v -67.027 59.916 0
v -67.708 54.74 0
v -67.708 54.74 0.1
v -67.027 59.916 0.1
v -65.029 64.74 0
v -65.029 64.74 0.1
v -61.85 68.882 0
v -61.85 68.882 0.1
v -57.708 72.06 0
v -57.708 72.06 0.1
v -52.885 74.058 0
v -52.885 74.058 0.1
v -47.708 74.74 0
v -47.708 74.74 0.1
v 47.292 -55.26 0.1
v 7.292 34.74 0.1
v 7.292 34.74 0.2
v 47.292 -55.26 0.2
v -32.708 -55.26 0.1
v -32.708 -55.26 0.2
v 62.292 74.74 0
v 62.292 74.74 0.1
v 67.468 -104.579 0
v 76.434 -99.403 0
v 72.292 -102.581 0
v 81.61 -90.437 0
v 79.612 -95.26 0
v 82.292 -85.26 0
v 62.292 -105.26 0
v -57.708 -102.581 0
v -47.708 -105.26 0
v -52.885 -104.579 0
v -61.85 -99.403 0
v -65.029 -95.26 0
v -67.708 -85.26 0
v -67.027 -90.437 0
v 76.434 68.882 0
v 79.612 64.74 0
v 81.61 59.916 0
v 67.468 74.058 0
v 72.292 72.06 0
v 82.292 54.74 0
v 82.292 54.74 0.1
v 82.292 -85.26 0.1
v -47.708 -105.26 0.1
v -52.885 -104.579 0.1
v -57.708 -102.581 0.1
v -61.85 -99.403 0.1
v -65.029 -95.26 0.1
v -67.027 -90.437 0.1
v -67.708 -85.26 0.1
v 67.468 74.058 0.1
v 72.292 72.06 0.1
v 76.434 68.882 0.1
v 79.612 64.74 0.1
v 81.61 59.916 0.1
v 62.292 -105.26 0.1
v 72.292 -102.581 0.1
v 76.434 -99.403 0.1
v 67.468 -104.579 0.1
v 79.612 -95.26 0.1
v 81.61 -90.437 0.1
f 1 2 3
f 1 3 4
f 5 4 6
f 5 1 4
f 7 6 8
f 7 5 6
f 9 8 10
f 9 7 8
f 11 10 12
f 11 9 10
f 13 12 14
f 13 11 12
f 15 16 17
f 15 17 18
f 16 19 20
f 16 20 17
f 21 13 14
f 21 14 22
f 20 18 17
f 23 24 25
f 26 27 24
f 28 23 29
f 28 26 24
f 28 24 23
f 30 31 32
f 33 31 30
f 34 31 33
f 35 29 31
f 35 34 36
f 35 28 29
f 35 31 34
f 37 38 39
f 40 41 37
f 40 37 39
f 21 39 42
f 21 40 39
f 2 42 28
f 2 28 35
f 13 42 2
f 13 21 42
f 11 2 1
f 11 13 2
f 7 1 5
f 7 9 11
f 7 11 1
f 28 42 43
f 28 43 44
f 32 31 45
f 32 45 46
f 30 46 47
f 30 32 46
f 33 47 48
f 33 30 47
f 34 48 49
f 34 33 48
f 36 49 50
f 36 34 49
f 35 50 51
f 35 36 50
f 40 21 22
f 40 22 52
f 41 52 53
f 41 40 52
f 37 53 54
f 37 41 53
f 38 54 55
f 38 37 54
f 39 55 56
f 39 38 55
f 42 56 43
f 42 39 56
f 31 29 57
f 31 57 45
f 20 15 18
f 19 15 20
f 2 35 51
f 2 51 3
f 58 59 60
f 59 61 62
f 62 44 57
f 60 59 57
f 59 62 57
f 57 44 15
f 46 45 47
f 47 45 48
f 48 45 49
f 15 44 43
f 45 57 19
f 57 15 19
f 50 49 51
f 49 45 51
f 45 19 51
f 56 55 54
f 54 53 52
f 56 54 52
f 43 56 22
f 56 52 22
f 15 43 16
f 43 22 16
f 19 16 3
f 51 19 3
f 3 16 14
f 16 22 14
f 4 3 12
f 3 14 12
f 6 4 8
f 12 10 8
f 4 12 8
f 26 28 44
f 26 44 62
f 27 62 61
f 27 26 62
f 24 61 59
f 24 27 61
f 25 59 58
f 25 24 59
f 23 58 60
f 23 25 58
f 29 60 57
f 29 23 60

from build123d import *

# Parameters (mm, degrees)
SALIENTE_EXTRUIR2_DEPTH = 0.1
SALIENTE_EXTRUIR3_DEPTH = 0.1


with BuildPart() as part:
    # Croquis1 → Saliente-Extruir2 (new body)
    with BuildSketch(Plane.XY):
        with BuildLine():
            Line((-47.708333333, 74.739583333), (62.291666667, 74.739583333))
            ThreePointArc((62.291666667, 74.739583333), (76.43380229, 68.881718957), (82.291666667, 54.739583333))
            Line((82.291666667, 54.739583333), (82.291666667, -85.260416667))
            ThreePointArc((82.291666667, -85.260416667), (76.43380229, -99.40255229), (62.291666667, -105.260416667))
            Line((62.291666667, -105.260416667), (-47.708333333, -105.260416667))
            ThreePointArc((-47.708333333, -105.260416667), (-61.850468957, -99.40255229), (-67.708333333, -85.260416667))
            Line((-67.708333333, -85.260416667), (-67.708333333, 54.739583333))
            ThreePointArc((-67.708333333, 54.739583333), (-61.850468957, 68.881718957), (-47.708333333, 74.739583333))
        make_face()
    extrude(amount=SALIENTE_EXTRUIR2_DEPTH)

    # Croquis2 → Saliente-Extruir3 (add)
    with BuildSketch(Plane.XY.offset(0.1)):
        Polygon((-32.708333333, -55.260416667), (7.291666667, 34.739583333), (47.291666667, -55.260416667), align=None)
    extrude(amount=SALIENTE_EXTRUIR3_DEPTH)


solid = part.part
